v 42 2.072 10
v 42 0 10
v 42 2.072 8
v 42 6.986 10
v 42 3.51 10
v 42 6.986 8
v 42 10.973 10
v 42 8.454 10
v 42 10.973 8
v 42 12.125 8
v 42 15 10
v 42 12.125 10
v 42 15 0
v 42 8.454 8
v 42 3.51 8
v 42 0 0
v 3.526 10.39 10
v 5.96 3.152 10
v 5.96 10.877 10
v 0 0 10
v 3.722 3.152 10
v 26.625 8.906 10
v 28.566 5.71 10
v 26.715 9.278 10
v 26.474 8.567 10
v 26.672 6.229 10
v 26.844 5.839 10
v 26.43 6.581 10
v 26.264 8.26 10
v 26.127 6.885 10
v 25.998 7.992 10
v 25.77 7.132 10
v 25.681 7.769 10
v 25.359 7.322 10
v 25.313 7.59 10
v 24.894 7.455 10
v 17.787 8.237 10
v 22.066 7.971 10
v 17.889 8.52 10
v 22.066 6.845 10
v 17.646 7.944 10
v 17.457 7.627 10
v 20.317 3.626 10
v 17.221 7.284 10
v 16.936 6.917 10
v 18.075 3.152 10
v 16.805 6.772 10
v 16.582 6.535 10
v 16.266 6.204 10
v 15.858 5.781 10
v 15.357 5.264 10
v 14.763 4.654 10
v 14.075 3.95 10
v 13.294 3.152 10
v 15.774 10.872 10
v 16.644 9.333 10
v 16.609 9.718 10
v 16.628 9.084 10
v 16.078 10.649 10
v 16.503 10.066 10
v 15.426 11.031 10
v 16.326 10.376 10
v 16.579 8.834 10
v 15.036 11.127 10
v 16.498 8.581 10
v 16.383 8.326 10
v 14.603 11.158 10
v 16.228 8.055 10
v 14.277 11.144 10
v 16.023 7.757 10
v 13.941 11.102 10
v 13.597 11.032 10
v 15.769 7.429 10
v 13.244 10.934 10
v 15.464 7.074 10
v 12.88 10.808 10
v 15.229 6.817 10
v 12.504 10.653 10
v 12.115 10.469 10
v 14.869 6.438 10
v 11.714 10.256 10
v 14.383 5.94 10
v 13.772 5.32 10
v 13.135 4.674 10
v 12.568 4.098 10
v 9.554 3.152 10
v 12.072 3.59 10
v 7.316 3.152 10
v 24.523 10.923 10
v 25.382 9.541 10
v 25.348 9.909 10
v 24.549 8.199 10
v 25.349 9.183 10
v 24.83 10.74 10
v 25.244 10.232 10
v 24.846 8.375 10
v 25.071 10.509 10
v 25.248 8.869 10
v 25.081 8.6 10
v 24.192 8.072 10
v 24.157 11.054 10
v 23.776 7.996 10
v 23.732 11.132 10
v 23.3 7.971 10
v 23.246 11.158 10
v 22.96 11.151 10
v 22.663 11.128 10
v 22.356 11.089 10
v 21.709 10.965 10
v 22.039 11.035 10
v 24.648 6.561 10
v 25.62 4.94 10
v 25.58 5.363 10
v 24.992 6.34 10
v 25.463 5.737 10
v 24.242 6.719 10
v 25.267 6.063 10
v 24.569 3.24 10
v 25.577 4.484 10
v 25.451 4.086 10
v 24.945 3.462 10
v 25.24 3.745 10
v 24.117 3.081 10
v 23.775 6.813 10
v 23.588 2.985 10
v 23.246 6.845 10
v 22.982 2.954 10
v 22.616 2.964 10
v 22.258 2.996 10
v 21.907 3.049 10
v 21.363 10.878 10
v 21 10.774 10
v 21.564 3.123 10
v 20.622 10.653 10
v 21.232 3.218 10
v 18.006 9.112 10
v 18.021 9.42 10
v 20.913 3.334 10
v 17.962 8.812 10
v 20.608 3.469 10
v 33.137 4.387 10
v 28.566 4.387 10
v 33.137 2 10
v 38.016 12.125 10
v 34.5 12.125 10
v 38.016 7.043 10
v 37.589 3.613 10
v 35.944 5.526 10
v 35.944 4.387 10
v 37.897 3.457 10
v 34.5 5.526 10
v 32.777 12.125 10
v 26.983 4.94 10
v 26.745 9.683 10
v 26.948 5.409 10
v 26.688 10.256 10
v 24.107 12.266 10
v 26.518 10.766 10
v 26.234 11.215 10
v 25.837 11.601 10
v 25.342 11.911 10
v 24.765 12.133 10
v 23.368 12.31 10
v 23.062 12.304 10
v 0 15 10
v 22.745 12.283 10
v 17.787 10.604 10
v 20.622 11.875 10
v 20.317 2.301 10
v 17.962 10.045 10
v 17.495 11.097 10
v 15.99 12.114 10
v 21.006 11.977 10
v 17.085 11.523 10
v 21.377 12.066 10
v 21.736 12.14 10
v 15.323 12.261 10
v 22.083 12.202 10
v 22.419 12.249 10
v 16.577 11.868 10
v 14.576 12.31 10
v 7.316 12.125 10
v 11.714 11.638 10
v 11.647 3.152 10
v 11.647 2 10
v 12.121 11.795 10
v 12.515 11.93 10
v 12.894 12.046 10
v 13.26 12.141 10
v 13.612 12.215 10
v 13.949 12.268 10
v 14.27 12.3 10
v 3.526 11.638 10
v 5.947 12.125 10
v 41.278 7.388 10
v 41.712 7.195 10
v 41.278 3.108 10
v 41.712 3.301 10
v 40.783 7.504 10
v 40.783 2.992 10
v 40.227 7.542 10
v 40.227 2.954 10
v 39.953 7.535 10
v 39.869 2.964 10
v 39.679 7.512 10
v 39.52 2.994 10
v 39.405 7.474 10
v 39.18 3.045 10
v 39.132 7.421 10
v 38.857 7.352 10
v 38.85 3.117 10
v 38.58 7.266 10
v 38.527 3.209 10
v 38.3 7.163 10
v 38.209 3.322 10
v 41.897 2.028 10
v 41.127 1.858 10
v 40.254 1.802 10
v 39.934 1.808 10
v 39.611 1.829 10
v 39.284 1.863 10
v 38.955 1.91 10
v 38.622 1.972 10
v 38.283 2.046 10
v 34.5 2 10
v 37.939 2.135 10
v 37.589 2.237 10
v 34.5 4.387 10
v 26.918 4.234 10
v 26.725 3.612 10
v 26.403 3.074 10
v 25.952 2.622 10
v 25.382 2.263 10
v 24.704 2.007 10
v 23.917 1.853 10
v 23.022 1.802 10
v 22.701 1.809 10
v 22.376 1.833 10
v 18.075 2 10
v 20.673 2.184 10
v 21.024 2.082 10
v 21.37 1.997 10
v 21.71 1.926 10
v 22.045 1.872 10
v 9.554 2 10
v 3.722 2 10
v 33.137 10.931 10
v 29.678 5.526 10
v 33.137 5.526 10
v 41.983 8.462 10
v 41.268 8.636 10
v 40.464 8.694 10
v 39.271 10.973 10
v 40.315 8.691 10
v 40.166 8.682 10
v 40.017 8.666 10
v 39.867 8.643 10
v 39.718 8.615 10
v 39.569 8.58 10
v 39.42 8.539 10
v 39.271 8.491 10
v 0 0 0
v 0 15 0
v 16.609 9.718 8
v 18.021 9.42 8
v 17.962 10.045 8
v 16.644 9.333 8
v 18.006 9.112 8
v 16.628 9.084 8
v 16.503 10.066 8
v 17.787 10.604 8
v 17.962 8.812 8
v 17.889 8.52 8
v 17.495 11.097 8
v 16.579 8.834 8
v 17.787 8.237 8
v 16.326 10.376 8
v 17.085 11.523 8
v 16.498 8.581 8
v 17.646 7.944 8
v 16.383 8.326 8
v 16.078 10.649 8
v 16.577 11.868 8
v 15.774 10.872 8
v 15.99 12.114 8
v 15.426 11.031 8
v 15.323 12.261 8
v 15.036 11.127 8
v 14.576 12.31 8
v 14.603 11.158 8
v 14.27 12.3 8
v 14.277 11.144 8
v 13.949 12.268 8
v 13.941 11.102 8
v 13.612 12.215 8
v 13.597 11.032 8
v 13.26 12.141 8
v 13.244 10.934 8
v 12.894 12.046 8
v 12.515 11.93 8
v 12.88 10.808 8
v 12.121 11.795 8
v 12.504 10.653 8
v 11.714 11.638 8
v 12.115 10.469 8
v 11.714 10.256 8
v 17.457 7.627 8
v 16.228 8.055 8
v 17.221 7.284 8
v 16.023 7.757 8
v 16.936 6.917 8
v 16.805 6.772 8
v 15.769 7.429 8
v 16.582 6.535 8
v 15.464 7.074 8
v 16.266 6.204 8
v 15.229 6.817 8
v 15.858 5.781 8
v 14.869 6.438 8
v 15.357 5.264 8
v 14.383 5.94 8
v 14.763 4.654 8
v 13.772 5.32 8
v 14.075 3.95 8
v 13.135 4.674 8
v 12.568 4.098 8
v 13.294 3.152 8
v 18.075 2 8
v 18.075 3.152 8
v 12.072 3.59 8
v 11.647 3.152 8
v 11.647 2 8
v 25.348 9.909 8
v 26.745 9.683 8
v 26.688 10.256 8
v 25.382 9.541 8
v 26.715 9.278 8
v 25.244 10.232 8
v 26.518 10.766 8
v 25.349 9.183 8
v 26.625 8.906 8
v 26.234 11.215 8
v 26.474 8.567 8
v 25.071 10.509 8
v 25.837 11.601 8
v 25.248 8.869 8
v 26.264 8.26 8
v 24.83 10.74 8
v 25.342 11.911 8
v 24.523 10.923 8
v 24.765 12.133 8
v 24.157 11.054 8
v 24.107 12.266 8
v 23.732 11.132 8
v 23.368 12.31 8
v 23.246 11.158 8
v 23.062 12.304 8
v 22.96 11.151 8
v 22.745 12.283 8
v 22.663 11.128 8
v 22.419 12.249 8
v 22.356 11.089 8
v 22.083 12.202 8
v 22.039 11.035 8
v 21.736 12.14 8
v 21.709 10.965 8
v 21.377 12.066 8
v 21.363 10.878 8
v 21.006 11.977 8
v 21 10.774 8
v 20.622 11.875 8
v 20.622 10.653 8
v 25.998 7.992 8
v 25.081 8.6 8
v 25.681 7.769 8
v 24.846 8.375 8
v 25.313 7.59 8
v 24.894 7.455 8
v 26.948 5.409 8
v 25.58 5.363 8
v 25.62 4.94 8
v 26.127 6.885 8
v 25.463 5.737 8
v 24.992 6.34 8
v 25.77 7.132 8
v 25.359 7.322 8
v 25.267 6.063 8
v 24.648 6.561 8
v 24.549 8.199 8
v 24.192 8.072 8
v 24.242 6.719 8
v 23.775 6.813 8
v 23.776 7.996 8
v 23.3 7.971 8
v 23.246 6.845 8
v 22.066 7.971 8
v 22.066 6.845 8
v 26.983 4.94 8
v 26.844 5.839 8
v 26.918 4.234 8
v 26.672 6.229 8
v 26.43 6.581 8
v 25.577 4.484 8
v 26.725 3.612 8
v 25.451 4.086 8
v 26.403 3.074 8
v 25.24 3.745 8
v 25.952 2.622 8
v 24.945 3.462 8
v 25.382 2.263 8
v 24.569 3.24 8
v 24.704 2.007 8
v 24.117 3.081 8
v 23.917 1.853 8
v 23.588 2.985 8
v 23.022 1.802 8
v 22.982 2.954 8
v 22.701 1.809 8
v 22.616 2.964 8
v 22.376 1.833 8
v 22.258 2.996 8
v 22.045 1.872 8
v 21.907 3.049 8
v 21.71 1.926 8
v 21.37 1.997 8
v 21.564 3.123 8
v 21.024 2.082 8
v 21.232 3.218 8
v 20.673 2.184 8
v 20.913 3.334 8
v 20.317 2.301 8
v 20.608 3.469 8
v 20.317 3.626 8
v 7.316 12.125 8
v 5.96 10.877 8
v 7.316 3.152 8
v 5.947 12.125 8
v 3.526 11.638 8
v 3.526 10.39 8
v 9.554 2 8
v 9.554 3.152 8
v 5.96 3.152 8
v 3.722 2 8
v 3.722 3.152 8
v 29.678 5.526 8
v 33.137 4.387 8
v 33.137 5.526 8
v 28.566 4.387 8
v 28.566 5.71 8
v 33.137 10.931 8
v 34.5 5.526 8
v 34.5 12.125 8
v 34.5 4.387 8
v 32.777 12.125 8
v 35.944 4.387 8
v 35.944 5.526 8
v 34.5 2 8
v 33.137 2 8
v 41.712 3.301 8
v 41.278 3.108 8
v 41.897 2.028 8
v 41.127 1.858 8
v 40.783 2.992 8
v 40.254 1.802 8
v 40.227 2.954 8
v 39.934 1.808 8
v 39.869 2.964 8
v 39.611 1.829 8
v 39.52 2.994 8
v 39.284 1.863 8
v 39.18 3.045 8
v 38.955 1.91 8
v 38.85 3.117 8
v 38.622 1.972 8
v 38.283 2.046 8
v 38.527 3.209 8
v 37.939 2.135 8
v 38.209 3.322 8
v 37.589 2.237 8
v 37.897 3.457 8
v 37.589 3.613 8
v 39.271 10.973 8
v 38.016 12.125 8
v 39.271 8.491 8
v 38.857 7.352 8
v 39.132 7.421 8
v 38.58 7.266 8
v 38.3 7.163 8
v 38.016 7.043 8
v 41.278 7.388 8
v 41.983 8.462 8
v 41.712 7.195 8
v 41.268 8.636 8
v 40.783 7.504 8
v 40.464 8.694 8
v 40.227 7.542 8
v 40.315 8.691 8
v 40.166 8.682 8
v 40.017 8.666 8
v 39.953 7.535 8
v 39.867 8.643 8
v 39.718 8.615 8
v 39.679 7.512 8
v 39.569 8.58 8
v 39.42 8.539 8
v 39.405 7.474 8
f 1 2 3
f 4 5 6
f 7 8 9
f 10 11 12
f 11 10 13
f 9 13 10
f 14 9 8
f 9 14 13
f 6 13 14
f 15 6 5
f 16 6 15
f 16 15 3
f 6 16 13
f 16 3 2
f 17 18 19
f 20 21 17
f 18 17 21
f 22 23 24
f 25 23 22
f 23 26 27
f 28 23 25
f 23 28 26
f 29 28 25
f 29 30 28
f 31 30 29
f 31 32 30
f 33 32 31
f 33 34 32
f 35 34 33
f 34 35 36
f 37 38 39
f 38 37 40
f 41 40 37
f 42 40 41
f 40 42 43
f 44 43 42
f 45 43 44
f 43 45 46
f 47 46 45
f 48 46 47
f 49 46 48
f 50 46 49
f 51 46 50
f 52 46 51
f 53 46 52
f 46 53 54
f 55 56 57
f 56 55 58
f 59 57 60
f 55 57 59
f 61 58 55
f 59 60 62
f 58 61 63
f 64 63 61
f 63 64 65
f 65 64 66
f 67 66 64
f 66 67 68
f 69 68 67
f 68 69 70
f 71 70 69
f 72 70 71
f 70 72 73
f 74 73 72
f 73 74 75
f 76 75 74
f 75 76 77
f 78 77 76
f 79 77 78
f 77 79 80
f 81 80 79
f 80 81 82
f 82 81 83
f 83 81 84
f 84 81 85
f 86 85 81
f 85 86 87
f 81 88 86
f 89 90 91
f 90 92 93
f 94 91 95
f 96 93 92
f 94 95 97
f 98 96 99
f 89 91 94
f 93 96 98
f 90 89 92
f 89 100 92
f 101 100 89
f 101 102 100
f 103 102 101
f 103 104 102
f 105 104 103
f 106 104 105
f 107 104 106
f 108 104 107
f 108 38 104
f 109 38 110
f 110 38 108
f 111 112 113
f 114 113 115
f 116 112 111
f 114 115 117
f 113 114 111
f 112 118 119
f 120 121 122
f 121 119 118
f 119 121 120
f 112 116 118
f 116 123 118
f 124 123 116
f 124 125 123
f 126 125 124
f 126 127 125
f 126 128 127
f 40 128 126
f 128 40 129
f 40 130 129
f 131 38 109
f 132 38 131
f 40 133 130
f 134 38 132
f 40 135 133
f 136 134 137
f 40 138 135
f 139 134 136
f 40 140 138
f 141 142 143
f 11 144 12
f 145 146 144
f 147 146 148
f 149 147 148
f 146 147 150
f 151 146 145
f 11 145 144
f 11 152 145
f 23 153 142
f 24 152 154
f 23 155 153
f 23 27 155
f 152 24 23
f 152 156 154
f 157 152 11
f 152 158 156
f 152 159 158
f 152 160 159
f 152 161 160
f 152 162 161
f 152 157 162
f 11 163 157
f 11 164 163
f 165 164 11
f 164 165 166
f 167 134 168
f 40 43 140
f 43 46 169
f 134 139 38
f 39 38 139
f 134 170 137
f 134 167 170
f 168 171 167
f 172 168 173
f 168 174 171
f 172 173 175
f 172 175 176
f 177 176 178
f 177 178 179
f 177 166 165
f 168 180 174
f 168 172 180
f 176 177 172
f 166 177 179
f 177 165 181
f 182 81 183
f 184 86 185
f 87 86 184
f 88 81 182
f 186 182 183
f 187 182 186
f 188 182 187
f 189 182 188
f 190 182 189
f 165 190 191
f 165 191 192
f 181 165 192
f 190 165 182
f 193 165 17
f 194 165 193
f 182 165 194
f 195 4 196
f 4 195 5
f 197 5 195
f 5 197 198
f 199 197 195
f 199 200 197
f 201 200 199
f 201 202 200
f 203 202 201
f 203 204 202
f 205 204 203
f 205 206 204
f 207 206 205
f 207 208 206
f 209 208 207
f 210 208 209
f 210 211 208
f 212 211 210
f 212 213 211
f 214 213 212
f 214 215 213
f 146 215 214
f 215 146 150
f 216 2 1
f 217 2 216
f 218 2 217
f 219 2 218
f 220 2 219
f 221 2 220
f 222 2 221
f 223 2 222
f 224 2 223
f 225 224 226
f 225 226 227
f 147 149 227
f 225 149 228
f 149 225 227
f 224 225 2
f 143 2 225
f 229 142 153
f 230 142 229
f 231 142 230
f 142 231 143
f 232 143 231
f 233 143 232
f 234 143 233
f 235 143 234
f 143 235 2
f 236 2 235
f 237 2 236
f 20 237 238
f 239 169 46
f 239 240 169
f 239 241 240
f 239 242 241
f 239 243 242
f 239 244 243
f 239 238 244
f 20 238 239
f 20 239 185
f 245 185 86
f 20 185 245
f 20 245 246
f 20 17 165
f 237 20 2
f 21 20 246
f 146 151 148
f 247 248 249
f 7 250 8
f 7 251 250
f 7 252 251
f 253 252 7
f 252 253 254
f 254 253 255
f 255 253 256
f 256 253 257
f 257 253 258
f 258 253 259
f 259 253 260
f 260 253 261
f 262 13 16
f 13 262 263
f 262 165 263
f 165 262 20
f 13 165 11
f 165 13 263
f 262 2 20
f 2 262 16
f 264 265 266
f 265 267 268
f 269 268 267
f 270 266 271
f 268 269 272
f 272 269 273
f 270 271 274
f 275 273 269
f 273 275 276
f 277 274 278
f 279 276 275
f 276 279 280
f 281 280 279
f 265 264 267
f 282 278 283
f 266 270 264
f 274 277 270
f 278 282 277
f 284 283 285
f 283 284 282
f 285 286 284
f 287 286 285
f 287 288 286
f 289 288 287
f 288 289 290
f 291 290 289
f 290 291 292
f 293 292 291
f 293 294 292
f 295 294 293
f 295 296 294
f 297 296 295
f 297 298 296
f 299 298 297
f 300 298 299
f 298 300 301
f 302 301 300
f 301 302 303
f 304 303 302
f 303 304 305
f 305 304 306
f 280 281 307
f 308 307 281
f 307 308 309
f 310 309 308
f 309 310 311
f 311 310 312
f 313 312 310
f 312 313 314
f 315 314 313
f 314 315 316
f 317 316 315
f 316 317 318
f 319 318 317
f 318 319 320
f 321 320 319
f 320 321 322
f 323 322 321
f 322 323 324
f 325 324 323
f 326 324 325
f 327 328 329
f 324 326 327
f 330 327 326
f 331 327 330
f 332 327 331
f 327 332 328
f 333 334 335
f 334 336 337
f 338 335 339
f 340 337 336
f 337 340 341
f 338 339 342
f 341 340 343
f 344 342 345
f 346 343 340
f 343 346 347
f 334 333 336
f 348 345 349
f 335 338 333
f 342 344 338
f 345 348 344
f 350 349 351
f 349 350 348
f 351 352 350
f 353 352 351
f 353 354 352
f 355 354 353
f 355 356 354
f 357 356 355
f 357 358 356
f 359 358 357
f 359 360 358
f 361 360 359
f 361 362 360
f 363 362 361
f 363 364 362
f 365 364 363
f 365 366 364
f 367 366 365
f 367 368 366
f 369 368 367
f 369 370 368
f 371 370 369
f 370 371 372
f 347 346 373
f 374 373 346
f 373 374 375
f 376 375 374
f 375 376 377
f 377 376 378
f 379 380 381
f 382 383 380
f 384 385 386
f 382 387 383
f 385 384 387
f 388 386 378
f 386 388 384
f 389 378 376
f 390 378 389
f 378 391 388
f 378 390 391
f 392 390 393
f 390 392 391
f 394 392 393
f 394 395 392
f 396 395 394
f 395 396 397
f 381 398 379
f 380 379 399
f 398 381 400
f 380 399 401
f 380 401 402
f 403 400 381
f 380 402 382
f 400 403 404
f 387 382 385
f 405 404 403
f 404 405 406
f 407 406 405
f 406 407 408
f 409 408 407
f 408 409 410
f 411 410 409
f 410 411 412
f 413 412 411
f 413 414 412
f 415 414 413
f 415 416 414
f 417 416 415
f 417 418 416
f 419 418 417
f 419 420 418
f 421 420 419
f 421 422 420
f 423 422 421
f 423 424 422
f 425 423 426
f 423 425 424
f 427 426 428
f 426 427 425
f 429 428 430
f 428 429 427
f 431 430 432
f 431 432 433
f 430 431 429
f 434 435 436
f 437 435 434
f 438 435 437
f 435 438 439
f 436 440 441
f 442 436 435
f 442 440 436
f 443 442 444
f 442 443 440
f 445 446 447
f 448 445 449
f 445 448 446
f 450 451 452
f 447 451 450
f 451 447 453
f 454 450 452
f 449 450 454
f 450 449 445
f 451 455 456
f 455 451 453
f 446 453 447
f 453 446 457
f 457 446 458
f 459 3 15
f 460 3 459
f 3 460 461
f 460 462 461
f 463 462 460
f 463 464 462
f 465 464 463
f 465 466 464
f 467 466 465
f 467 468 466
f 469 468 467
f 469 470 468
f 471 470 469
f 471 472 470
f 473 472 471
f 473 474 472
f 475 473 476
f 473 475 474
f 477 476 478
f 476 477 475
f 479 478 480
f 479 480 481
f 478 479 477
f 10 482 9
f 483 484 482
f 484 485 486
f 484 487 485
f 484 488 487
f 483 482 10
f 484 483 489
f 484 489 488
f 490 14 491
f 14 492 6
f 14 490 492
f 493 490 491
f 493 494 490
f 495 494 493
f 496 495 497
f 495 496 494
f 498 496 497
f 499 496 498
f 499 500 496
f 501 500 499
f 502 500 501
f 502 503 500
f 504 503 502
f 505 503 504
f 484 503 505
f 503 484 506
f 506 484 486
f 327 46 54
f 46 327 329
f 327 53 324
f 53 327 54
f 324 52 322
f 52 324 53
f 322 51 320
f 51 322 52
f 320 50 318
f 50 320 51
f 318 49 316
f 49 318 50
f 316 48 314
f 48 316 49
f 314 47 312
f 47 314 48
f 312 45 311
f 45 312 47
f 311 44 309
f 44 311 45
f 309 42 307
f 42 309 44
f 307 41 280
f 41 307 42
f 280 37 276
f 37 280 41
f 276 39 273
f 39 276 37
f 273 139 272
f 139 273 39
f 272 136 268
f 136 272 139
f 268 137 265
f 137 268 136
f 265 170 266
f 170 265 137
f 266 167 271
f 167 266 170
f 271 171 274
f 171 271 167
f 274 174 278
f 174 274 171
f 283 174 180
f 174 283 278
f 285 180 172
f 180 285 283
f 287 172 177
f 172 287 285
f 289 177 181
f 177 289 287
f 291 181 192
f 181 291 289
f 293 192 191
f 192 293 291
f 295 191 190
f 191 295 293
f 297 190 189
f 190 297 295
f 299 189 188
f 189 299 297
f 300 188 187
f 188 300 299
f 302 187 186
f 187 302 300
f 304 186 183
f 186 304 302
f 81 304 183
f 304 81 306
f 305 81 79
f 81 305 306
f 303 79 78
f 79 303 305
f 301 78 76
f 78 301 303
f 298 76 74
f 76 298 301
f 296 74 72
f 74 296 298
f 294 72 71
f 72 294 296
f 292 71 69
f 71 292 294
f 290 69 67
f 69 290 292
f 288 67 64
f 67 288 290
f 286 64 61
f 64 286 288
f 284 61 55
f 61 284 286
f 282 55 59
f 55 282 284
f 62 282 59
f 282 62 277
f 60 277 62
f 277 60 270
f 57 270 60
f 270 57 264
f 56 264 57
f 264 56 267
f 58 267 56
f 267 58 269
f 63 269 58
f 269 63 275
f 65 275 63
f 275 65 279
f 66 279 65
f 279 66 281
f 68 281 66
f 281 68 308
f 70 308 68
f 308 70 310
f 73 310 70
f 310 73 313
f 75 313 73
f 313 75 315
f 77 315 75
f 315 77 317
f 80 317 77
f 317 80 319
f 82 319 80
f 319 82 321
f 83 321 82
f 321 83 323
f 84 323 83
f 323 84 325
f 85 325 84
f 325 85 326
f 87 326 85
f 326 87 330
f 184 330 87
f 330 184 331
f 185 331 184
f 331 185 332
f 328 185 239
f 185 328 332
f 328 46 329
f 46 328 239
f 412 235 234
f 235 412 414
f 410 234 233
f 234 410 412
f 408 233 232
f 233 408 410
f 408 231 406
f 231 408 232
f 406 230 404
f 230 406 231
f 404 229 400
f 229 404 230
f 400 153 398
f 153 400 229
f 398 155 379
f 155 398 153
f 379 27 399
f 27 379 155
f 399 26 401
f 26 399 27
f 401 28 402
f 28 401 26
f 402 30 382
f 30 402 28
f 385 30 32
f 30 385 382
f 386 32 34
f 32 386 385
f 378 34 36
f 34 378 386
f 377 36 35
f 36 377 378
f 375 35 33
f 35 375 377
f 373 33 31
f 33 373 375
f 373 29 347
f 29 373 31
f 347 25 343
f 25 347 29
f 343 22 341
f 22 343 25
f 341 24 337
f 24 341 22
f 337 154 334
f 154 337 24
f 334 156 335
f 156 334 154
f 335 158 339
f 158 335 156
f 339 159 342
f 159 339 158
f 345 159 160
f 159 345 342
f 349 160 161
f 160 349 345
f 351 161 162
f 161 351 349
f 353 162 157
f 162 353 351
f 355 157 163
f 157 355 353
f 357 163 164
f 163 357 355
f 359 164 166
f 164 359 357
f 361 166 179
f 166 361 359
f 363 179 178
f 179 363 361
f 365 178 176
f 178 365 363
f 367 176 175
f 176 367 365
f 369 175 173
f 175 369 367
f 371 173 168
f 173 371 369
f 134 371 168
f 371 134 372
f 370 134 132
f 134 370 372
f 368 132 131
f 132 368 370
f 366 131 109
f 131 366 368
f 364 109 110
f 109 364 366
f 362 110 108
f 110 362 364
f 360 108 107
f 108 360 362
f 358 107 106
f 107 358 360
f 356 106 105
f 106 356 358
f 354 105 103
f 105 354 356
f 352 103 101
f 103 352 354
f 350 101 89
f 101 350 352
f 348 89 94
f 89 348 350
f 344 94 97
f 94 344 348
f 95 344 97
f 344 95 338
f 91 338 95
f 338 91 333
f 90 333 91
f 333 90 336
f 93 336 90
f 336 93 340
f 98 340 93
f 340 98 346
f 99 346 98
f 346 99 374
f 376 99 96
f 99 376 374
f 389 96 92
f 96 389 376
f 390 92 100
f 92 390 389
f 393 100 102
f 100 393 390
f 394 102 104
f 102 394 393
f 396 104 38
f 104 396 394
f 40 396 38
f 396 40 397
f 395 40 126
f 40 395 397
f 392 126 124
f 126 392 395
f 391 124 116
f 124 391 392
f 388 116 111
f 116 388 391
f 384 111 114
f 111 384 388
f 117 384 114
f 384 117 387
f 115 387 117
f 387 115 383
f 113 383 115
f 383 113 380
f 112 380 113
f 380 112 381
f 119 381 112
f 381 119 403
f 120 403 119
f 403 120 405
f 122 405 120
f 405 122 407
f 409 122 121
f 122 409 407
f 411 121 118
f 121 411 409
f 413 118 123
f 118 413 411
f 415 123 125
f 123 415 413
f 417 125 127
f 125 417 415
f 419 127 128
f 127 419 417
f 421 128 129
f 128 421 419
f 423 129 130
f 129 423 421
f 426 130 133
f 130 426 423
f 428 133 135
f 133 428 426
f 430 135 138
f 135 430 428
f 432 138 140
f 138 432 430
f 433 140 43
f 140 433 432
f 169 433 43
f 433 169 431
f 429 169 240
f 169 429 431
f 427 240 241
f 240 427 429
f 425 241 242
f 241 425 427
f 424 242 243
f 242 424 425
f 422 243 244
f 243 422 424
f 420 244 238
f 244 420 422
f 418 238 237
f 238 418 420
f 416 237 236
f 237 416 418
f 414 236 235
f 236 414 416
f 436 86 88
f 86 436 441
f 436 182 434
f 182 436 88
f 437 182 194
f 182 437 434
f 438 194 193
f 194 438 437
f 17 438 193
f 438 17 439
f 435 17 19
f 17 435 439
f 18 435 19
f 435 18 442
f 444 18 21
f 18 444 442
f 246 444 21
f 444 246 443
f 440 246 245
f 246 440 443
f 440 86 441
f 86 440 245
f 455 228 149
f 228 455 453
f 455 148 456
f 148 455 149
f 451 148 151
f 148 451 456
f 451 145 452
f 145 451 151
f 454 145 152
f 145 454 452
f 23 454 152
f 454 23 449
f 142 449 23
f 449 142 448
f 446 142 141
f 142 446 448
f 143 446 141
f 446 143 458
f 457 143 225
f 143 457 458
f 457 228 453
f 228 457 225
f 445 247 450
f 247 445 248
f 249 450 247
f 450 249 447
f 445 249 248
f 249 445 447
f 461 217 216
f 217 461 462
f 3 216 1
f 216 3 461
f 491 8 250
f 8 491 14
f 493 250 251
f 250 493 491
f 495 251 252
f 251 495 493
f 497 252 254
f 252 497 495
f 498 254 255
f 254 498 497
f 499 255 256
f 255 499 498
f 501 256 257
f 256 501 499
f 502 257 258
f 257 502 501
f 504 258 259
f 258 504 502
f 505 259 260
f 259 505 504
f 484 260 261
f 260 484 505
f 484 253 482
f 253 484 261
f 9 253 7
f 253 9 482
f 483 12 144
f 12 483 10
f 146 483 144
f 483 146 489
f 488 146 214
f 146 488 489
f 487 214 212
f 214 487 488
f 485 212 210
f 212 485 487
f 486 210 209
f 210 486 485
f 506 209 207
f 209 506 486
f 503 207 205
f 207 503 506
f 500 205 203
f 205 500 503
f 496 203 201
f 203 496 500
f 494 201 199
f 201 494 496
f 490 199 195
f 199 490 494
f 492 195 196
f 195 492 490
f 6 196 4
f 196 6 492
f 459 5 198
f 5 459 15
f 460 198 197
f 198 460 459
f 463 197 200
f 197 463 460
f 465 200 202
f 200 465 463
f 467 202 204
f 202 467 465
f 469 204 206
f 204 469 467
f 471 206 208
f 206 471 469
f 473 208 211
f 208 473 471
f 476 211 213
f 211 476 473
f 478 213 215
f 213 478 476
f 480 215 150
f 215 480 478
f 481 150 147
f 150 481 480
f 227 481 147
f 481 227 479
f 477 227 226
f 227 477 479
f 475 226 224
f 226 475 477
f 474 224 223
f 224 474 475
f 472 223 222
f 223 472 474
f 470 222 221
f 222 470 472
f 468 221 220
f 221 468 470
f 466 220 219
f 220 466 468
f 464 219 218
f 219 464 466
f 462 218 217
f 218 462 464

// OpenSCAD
difference() {
  cube([42,15,10]);
  #translate([2,2,8]) linear_extrude(2) text("12345", font="Comic Mono");
}
